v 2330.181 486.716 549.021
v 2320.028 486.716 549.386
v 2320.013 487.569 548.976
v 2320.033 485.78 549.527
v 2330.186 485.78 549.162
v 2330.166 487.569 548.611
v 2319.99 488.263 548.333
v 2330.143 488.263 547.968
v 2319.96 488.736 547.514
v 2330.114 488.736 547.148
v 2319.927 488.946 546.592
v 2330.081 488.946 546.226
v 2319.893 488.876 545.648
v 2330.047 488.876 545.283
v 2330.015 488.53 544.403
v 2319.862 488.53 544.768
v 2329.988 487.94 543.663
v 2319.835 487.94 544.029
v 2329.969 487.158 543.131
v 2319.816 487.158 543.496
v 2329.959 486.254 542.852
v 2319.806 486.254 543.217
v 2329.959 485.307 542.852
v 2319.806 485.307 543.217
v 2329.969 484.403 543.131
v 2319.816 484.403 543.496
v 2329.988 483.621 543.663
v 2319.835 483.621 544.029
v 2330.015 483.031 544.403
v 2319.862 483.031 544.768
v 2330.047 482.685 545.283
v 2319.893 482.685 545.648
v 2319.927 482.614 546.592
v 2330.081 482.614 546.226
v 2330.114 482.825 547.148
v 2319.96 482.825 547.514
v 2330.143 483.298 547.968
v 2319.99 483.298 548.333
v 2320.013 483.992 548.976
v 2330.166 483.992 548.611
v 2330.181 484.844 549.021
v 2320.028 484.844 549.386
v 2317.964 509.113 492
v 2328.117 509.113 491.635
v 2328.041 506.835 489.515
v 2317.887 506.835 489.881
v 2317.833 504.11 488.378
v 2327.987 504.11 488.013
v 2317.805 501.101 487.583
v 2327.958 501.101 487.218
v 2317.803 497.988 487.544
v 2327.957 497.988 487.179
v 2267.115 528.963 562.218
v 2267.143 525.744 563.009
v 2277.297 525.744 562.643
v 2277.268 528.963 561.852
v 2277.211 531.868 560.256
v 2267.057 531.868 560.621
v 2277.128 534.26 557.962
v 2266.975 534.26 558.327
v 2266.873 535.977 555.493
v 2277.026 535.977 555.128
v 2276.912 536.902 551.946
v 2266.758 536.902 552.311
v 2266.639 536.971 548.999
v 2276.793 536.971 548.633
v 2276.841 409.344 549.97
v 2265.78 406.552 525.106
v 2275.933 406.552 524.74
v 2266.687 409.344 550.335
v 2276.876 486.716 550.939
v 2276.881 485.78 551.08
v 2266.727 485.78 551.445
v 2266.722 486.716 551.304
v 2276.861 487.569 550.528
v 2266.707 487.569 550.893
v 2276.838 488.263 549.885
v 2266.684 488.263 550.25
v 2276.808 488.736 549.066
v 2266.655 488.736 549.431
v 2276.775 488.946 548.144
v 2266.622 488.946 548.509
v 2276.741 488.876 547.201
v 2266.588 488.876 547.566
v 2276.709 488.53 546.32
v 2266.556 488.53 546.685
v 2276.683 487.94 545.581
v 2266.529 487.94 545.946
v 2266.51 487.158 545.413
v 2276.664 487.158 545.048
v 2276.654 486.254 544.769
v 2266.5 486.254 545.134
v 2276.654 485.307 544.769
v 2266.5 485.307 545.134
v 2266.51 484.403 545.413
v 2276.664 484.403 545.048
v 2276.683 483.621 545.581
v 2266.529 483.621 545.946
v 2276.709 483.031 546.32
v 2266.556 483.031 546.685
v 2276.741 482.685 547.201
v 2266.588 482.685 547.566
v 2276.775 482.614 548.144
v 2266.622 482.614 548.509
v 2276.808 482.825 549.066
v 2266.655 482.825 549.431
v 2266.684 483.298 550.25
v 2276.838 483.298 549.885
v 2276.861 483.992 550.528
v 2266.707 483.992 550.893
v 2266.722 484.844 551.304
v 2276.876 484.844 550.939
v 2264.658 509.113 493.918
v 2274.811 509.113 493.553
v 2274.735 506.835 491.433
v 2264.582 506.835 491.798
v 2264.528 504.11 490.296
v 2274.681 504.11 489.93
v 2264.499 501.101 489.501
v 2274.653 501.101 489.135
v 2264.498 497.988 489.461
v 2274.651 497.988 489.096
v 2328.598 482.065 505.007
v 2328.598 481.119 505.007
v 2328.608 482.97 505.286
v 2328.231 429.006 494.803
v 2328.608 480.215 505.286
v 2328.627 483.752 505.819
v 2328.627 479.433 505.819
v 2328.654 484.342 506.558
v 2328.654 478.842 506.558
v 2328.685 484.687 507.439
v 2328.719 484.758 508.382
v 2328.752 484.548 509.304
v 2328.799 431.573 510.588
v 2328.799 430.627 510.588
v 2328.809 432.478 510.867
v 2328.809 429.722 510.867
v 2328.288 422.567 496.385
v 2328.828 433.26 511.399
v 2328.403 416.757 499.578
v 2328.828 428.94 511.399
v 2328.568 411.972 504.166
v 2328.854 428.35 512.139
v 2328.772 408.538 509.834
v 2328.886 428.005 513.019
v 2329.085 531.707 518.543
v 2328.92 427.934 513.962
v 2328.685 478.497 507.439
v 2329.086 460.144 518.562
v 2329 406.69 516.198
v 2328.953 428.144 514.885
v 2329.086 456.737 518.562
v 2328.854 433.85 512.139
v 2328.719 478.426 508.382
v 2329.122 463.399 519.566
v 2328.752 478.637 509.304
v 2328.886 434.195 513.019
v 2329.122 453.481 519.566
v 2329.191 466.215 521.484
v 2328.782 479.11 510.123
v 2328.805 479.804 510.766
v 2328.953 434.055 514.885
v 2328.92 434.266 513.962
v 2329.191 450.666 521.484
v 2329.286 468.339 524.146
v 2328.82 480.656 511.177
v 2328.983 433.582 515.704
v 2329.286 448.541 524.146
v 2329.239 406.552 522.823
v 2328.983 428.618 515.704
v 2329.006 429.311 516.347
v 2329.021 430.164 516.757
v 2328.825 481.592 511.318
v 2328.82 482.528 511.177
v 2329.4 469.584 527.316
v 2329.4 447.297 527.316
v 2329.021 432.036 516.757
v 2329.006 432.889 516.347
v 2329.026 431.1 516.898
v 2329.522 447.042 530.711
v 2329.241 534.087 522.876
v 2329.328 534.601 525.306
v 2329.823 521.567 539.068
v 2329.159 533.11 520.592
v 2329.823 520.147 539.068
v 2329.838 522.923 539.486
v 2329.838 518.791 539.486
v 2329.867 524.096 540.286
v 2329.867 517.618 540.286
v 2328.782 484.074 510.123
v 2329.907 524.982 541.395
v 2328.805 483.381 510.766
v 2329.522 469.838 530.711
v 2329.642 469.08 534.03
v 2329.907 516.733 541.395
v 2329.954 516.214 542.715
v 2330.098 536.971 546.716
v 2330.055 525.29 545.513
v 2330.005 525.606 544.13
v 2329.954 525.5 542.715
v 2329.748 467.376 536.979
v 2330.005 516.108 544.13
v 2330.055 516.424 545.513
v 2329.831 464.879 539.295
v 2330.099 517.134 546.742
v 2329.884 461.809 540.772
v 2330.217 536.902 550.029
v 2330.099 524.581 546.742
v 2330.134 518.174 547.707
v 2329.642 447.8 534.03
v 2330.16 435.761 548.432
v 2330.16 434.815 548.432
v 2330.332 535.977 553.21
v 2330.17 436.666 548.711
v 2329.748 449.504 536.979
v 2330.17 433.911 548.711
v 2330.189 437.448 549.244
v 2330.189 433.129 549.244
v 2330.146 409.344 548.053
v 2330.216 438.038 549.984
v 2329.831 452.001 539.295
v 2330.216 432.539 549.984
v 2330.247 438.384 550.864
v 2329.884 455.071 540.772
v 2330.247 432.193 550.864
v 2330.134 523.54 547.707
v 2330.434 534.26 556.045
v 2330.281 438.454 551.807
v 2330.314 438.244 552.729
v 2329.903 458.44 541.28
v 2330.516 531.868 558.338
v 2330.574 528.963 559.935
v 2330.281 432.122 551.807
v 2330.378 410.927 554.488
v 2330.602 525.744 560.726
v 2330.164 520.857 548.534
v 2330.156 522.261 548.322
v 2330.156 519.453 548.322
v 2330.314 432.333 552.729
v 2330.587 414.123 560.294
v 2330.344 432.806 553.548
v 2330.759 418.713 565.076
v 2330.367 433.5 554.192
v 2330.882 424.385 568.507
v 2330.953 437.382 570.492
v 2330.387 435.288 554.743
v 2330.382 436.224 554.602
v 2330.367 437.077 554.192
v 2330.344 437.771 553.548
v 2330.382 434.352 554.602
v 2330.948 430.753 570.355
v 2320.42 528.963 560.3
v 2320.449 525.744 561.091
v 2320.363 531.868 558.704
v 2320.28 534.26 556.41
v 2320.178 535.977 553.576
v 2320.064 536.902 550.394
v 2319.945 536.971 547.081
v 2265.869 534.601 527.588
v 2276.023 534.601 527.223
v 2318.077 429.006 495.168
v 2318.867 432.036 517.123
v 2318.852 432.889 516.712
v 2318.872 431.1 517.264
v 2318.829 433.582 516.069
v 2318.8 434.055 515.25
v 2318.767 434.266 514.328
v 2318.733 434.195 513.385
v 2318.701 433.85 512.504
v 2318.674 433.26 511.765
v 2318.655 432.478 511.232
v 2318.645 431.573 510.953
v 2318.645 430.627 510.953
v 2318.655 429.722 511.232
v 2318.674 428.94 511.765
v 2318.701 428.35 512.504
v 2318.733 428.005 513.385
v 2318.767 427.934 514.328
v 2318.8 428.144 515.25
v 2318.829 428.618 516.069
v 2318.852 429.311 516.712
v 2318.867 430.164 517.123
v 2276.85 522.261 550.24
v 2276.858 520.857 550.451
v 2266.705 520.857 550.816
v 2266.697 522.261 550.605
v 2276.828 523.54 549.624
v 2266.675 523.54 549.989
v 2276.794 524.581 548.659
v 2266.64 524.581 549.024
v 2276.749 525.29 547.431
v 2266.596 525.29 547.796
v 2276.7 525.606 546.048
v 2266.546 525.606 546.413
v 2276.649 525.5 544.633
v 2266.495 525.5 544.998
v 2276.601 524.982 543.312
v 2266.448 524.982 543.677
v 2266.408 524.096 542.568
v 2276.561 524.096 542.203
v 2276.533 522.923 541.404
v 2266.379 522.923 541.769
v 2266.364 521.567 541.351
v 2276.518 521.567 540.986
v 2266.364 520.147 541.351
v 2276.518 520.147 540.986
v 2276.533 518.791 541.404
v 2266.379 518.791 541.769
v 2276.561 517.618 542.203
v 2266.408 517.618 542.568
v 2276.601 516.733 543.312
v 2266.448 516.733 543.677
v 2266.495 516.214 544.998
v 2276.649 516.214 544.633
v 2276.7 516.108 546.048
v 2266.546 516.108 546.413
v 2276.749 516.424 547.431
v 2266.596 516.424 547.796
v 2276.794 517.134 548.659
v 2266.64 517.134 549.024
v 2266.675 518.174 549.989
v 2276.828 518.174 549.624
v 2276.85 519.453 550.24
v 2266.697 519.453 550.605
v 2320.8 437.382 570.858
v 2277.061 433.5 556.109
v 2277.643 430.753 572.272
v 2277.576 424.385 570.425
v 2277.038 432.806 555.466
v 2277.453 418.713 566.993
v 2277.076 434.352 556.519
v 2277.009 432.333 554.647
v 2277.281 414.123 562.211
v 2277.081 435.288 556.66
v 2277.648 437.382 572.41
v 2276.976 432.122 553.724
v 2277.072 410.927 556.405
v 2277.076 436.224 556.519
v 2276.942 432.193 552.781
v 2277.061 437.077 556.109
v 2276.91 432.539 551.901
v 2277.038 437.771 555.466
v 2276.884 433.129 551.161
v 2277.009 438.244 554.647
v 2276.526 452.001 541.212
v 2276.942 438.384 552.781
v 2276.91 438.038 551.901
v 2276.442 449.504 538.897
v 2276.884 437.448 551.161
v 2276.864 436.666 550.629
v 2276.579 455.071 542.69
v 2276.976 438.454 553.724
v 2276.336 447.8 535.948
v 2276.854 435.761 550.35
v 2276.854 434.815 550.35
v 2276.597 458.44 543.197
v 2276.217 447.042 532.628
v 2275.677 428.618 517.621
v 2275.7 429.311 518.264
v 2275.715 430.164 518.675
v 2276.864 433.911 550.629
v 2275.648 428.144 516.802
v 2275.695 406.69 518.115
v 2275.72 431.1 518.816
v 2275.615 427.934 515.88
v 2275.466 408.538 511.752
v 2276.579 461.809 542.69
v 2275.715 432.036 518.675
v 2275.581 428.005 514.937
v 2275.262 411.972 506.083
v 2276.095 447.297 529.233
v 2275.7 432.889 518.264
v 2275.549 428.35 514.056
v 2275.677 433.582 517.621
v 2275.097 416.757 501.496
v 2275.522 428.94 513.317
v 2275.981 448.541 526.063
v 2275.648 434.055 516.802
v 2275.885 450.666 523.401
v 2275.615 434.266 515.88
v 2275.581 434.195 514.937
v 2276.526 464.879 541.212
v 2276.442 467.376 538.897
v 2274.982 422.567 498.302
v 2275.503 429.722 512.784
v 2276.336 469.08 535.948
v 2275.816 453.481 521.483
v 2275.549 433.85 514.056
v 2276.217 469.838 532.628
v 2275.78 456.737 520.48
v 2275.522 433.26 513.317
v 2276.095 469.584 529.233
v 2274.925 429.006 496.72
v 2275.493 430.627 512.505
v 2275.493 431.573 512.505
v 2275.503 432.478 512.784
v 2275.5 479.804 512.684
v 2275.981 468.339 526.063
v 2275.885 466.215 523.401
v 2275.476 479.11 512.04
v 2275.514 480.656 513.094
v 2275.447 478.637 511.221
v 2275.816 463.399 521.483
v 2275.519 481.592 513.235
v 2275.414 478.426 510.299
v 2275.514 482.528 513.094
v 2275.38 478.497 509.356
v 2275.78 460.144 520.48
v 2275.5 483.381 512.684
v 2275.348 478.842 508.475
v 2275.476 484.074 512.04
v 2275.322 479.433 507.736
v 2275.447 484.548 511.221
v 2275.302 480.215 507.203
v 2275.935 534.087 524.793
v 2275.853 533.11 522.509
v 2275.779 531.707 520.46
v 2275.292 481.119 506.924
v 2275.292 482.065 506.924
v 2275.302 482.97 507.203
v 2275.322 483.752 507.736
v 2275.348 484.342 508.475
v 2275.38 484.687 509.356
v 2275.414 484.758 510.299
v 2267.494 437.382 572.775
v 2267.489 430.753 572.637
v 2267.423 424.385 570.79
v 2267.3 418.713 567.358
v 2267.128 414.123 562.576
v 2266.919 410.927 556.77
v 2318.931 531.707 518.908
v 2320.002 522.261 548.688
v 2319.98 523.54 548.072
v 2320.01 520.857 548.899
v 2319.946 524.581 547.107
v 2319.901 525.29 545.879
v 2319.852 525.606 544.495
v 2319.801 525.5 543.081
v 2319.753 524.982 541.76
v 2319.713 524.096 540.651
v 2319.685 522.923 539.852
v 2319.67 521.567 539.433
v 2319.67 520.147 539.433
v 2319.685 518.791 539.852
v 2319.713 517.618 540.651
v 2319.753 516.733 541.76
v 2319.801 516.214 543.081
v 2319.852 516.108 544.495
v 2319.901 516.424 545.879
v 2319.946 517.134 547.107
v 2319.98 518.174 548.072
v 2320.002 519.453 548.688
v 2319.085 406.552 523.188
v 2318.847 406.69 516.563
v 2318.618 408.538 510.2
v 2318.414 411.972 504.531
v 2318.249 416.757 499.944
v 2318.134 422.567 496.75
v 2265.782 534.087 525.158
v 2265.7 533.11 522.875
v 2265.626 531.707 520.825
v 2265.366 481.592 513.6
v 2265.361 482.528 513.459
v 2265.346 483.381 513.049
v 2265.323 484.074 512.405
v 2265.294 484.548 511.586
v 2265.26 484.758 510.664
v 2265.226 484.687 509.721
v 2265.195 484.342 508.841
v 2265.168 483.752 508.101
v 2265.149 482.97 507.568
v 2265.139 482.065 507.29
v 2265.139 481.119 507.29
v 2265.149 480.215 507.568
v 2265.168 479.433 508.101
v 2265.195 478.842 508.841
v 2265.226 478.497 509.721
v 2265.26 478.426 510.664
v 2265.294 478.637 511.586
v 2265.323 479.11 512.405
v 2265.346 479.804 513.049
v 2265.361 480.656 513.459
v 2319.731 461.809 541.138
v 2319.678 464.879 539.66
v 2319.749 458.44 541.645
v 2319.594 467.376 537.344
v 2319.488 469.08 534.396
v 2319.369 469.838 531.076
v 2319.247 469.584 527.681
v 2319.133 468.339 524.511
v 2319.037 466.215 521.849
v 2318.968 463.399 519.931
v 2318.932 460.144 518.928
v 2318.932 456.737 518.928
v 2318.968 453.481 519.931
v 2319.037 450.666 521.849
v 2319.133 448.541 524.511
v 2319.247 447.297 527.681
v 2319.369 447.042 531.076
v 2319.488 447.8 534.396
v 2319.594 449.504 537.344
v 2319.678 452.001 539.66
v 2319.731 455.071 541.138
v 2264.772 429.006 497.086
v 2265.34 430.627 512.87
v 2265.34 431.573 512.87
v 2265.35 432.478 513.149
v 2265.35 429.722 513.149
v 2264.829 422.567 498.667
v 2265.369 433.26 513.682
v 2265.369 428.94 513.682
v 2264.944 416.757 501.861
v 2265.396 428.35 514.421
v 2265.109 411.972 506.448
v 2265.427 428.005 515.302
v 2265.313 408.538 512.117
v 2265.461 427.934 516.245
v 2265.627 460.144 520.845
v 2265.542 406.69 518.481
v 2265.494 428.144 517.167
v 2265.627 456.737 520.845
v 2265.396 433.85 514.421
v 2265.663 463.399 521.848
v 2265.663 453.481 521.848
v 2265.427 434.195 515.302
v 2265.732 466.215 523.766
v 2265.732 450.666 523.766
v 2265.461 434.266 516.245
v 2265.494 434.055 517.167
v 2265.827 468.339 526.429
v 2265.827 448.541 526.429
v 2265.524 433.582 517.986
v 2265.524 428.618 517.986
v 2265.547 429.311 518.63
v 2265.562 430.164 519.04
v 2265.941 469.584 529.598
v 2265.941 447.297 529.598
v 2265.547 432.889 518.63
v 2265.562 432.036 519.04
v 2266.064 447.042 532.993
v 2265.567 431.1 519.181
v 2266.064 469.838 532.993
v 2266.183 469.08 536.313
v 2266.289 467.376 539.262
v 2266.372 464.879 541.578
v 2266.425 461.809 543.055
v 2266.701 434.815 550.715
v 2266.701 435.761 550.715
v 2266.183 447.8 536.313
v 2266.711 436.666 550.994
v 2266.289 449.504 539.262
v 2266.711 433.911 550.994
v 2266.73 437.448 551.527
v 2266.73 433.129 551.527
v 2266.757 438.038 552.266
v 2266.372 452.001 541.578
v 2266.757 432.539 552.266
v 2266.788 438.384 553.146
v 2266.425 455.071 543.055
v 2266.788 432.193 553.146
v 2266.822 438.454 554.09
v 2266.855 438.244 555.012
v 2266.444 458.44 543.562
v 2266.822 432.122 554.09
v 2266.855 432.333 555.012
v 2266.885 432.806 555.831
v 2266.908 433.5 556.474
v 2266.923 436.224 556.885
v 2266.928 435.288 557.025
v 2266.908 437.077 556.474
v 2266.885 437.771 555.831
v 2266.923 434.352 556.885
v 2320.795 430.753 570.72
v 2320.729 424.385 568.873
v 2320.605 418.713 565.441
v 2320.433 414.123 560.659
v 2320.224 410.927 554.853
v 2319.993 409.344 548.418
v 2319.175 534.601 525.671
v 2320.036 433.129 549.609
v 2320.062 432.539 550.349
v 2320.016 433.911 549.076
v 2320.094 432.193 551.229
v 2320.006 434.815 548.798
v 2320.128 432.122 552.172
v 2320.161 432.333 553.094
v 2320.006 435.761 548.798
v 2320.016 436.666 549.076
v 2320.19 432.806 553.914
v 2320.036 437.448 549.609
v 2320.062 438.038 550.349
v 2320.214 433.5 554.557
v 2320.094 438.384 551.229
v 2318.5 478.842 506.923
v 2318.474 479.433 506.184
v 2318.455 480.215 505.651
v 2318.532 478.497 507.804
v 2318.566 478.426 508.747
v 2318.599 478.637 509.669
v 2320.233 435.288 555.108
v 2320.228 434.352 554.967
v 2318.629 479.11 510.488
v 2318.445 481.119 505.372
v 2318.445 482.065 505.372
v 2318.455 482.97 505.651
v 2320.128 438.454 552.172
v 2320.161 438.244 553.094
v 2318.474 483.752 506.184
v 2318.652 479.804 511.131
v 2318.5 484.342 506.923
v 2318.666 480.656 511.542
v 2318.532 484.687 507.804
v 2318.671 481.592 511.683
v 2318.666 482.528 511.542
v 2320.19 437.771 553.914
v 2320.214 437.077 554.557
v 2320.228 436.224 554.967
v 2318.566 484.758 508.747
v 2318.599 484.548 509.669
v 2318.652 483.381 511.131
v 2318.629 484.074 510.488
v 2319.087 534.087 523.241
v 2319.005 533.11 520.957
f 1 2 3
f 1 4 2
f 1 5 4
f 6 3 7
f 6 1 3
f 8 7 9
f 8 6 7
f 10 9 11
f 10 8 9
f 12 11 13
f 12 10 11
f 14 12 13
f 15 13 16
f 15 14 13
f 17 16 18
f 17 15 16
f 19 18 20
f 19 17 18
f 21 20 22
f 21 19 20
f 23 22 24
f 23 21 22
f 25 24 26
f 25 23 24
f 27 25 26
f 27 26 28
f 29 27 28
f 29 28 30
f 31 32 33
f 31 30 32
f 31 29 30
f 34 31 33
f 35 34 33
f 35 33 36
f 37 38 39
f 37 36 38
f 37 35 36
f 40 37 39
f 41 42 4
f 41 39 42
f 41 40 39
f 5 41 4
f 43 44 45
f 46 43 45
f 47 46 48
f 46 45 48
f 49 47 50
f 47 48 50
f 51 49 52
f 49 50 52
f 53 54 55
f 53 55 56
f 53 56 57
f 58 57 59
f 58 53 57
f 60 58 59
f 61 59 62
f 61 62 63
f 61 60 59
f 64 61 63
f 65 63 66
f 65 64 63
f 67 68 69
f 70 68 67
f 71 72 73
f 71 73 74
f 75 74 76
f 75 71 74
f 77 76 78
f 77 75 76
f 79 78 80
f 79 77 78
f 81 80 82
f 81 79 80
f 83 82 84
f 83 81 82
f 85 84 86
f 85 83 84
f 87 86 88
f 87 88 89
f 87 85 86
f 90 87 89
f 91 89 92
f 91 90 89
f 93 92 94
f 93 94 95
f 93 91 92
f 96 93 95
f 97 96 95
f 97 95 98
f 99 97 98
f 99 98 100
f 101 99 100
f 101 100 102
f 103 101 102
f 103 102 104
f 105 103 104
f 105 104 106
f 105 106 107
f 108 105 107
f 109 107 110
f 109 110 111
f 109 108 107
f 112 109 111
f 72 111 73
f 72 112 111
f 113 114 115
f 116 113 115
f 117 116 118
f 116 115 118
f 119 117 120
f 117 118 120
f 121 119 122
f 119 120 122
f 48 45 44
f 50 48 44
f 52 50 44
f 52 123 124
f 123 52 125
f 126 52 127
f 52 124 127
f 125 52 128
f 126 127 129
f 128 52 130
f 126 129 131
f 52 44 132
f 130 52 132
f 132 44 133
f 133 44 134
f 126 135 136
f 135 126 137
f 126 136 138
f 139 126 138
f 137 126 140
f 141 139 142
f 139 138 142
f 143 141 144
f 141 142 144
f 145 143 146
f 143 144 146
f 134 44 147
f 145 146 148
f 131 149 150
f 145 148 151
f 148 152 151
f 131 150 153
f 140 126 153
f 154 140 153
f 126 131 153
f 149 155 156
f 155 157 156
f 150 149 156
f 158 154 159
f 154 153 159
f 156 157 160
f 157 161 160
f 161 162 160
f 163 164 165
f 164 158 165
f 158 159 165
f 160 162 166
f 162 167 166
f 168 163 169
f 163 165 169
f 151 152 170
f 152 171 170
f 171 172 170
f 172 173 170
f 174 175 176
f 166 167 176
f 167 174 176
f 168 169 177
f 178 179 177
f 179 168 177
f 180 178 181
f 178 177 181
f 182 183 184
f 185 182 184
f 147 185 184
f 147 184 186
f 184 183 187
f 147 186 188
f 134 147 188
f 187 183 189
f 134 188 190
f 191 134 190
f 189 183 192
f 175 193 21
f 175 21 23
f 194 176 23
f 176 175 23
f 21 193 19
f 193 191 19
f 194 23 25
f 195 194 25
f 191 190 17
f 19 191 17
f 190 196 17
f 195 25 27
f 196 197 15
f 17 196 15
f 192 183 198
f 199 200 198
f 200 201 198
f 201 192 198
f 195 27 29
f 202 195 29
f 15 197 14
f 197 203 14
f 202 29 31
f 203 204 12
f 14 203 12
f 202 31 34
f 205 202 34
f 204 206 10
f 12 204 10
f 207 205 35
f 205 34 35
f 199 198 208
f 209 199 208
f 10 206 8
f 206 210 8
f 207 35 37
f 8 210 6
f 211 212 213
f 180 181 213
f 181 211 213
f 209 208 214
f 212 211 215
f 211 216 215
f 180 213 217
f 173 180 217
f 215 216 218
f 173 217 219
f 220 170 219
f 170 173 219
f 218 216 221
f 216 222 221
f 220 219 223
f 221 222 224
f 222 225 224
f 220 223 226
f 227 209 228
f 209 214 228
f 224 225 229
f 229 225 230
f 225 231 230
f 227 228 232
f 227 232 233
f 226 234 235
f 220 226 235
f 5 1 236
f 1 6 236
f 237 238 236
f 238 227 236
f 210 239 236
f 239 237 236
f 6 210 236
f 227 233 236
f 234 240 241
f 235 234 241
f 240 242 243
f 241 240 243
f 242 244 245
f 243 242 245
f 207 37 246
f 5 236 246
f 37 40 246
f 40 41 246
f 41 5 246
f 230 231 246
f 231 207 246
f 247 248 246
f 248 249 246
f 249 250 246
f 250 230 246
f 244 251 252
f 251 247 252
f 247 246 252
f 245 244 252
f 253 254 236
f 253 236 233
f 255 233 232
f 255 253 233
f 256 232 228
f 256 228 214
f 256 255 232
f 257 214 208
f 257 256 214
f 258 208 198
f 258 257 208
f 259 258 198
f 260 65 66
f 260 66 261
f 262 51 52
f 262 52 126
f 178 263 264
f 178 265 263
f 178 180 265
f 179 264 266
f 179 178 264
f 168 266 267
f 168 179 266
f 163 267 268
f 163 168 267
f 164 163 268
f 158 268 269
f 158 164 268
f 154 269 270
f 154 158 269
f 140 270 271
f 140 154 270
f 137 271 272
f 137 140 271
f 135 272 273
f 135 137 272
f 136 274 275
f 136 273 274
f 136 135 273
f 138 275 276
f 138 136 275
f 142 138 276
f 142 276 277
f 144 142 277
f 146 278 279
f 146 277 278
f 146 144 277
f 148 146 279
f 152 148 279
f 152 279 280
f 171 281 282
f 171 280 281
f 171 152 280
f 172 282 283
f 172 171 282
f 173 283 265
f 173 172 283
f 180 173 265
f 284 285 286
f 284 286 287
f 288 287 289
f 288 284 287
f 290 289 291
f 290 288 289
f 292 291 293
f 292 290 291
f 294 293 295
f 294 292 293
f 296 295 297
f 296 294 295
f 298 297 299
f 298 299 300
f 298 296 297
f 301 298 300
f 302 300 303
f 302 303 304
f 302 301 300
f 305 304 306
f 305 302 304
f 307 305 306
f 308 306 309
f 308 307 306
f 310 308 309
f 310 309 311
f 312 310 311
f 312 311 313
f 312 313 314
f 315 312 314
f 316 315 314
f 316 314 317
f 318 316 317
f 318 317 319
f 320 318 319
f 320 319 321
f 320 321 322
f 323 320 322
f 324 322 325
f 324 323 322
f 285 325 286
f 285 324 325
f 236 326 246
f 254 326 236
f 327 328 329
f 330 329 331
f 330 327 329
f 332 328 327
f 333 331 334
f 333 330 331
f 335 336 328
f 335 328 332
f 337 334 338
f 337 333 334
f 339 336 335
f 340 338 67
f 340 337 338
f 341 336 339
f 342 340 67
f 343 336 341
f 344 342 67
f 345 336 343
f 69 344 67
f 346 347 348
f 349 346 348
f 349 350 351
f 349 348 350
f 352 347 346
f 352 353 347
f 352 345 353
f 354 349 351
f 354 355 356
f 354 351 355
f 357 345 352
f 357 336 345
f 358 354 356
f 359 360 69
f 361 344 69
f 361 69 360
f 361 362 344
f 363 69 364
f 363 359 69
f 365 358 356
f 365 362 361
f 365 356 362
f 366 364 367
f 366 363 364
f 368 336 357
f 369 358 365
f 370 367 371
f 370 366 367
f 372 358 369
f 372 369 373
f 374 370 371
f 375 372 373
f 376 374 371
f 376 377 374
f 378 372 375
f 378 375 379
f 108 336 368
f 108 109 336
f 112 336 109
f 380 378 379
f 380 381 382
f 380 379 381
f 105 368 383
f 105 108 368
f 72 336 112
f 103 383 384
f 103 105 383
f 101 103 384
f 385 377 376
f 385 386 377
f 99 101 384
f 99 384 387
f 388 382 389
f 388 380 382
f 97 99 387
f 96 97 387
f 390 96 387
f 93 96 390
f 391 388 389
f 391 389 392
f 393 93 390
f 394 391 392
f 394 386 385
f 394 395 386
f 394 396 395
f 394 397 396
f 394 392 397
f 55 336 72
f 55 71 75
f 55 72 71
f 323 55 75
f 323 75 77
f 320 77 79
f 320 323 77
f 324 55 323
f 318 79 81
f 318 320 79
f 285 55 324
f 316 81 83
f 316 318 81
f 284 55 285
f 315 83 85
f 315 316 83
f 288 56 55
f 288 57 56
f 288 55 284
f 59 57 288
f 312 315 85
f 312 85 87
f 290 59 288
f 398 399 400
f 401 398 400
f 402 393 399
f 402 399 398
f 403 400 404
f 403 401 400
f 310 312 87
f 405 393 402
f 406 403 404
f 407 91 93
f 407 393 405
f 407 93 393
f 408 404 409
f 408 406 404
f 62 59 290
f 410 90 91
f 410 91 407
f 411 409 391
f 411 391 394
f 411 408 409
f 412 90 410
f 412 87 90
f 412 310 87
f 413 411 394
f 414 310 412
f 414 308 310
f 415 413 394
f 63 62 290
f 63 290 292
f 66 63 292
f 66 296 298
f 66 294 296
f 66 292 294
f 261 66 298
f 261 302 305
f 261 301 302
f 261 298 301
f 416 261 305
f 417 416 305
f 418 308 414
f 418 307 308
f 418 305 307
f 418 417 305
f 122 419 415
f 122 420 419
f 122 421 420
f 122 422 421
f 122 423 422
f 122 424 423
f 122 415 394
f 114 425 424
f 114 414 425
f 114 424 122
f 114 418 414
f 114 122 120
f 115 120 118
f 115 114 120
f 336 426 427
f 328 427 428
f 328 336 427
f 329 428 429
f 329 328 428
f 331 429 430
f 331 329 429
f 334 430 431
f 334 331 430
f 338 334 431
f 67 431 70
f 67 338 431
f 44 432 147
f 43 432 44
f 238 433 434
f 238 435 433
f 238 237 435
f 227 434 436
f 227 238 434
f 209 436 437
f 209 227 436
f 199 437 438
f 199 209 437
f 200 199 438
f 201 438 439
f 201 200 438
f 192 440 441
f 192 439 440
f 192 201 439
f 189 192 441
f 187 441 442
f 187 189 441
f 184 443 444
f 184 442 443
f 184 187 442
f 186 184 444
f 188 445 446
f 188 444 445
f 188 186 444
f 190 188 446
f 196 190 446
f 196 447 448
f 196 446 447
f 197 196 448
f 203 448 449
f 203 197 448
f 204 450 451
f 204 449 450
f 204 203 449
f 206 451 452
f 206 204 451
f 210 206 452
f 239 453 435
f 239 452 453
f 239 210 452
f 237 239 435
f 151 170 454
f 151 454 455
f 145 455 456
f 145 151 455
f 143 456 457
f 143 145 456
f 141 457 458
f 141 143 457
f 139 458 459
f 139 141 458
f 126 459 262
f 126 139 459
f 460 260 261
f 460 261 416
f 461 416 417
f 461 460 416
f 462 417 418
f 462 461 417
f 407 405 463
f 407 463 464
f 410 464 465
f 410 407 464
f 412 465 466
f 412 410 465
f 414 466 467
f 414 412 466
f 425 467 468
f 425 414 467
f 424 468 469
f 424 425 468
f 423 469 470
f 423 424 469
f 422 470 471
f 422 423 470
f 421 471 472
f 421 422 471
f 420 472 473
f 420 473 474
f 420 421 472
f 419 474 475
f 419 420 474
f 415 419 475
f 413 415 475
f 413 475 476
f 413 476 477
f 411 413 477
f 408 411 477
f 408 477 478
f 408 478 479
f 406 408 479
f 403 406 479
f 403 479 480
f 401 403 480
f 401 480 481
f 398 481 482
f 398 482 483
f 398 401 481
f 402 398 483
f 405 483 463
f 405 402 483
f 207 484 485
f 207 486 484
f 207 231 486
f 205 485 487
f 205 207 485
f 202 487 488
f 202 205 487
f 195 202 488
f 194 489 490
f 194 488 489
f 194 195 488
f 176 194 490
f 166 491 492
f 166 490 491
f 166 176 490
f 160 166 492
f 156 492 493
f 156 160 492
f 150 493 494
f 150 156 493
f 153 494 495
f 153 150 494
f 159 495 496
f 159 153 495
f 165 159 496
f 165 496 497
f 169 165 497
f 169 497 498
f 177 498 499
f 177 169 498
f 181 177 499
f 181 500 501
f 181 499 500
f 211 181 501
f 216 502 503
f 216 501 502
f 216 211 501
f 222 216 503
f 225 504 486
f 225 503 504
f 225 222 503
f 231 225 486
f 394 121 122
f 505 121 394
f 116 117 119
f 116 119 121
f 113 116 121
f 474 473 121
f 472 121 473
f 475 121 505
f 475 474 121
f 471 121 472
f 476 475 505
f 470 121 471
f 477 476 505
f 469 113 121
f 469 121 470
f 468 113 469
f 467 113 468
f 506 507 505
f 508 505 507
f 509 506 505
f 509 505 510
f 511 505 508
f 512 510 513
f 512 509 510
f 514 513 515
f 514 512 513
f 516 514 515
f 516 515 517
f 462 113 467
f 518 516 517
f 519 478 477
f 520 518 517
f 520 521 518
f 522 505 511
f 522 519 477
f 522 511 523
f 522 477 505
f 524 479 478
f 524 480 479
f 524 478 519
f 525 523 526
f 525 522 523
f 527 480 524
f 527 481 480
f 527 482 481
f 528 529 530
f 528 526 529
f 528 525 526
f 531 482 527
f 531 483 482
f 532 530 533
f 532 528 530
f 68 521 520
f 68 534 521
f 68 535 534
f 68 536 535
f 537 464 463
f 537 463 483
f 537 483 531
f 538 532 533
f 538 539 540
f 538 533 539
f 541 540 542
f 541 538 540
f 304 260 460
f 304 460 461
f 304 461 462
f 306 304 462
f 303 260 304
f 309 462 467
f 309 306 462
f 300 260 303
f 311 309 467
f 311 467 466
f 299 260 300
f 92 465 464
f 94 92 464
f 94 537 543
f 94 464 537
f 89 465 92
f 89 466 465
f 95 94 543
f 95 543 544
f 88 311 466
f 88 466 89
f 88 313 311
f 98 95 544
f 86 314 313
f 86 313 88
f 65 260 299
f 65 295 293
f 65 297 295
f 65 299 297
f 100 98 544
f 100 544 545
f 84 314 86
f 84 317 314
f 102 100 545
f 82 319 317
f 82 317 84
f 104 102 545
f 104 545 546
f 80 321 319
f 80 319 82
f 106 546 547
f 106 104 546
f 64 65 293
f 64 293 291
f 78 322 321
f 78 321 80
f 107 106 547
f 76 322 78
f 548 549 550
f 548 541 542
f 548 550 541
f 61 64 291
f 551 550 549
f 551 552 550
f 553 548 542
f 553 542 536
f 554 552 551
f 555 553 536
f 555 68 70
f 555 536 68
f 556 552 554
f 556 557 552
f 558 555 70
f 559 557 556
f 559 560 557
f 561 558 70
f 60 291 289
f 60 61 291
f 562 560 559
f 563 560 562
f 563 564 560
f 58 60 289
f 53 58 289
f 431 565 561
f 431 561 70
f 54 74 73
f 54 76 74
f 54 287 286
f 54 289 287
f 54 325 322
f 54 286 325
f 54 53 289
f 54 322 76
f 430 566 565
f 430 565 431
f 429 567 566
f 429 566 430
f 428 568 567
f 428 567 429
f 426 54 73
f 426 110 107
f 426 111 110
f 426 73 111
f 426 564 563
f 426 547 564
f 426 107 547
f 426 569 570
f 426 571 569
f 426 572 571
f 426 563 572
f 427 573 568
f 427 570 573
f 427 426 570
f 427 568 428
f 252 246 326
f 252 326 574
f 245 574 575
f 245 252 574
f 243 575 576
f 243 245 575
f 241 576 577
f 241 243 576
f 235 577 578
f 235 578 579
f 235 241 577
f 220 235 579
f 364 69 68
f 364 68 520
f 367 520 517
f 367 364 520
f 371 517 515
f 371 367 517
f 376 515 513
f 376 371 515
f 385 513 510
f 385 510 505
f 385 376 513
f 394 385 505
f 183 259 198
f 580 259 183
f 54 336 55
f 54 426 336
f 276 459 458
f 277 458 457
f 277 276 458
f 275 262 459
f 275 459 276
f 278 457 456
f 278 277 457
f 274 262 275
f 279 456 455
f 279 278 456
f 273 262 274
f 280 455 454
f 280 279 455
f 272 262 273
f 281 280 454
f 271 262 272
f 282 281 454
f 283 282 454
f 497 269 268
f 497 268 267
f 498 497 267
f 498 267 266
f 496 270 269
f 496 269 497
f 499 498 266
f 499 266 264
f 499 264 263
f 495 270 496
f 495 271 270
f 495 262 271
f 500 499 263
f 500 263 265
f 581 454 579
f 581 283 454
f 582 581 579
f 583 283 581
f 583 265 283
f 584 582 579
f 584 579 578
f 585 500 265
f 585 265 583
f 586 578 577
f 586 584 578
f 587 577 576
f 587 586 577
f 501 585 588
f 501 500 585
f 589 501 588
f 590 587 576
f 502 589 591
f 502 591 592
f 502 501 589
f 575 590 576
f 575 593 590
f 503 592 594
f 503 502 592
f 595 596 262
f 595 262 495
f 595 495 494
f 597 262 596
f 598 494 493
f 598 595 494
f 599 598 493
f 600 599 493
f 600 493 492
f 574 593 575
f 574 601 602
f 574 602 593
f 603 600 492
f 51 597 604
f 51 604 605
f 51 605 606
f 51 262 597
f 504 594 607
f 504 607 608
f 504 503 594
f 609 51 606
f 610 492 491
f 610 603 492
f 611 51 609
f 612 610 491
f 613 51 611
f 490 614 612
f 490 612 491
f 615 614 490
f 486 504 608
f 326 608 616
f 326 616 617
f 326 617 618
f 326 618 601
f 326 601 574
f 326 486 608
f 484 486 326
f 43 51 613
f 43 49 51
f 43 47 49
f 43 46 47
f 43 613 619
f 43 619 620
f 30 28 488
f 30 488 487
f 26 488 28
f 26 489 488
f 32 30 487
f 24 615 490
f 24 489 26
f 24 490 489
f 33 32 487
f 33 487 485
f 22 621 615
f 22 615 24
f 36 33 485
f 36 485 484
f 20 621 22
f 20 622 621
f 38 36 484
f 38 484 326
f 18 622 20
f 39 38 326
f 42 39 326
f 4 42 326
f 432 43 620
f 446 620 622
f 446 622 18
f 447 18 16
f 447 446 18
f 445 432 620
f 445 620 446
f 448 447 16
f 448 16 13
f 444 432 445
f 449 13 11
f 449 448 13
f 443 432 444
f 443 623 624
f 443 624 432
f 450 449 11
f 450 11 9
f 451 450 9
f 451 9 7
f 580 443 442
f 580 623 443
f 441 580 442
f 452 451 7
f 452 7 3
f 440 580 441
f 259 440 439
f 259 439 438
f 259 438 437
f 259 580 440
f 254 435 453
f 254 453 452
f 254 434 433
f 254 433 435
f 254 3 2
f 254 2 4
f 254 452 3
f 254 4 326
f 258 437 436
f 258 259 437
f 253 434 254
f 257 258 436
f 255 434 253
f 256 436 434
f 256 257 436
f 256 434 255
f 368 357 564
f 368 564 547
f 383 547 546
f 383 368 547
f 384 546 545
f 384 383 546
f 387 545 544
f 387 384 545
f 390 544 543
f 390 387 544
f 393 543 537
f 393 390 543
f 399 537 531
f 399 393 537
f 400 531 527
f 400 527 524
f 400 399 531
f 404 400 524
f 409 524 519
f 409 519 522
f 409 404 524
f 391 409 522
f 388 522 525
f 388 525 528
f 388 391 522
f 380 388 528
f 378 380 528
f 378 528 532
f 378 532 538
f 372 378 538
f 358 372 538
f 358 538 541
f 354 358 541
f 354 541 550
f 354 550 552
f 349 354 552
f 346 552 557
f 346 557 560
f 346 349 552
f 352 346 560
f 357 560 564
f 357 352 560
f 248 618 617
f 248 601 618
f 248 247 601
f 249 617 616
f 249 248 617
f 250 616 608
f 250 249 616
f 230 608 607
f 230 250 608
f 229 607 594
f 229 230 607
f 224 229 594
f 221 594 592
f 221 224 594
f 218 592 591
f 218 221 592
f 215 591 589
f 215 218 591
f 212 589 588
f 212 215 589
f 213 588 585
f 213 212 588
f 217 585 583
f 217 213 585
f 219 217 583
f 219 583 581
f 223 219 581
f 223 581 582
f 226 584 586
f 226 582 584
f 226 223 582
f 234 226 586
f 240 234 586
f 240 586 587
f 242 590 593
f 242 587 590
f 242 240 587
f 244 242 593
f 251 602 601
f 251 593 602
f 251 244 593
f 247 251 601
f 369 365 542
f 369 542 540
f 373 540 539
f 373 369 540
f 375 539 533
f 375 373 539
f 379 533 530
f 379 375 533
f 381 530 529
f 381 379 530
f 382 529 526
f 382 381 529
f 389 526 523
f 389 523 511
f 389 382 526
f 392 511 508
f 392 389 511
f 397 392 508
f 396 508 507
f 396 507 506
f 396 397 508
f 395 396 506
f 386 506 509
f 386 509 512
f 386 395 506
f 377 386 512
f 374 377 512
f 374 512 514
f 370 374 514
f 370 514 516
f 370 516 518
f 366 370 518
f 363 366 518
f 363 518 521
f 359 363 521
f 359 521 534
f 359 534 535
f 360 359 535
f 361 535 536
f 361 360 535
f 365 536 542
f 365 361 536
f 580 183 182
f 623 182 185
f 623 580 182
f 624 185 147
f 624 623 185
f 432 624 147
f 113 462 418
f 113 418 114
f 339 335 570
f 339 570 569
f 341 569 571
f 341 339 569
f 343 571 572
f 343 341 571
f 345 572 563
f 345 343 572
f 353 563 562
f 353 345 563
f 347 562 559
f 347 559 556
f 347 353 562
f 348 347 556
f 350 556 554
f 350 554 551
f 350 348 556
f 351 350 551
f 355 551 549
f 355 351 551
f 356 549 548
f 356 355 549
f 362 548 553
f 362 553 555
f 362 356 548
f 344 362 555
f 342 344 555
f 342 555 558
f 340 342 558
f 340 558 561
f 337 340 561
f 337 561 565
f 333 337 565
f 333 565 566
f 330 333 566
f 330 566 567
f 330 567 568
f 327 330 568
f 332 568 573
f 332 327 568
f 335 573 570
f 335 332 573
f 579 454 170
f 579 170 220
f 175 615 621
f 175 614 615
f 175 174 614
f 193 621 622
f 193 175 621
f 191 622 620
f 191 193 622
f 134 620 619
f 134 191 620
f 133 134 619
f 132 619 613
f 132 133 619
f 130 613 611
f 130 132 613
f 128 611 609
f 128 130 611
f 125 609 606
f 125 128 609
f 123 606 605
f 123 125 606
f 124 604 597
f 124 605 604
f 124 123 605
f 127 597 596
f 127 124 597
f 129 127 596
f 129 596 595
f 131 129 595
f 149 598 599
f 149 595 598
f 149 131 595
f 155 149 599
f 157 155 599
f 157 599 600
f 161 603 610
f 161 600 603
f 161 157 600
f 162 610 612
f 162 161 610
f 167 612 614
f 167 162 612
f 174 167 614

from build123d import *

# Parameters (mm, degrees)
SKETCH2_R               = 4.7625
SKETCH2_R_2             = 3.175
SKETCH2_R_3             = 11.43
BOSS_EXTRUDE1_DEPTH     = 31.75
FILLET1_R               = 25.4
FILLET3_R               = 12.7
CUT_EXTRUDE1_DEPTH      = 2420.162449584
CUT_EXTRUDE1_DEPTH_BACK = 2420.162449584


with BuildPart() as part:
    # Sketch2 → Boss-Extrude1 (new, symmetric)
    with BuildSketch(Plane(origin=(2275.719022847, 0, -81.853759117), x_dir=(0.02419992607999972, -0.7394171395677195, 0.6728124978708514), z_dir=(-0.9993537674319818, 0, 0.03594506251913508))):
        Polygon((137.38245748, 763.046514622), (34.646501725, 837.707906218), (12.248084246, 806.887119491), (10.396857918, 761.134054446), (92.585622522, 701.404941169), align=None)
        with Locations((37.11326636, 814.409603855)):
            Circle(SKETCH2_R, mode=Mode.SUBTRACT)
        with Locations((64.541675287, 792.432956216)):
            Circle(SKETCH2_R_2, mode=Mode.SUBTRACT)
        with Locations((105.636057589, 762.568399578)):
            Circle(SKETCH2_R_2, mode=Mode.SUBTRACT)
        with Locations((83.237640111, 731.747612851)):
            Circle(SKETCH2_R_2, mode=Mode.SUBTRACT)
        with Locations((42.143257808, 761.61216949)):
            Circle(SKETCH2_R_2, mode=Mode.SUBTRACT)
        with Locations((73.889657699, 762.090284534)):
            Circle(SKETCH2_R_3, mode=Mode.SUBTRACT)
    extrude(amount=BOSS_EXTRUDE1_DEPTH, both=True)

    # Fillet1
    fillet1_edges = [part.edges().sort_by_distance(p)[0] for p in [
        (2296.601805866, 403.759777726, 498.73468398),
        (2299.324220067, 412.136269845, 574.423935798),
    ]]
    fillet(fillet1_edges, radius=FILLET1_R)

    # Fillet3
    fillet3_edges = [part.edges().sort_by_distance(p)[0] for p in [
        (2296.200347822, 504.744039468, 487.573245371),
        (2297.461190412, 534.178350963, 522.627511627),
        (2298.822397513, 538.366597022, 560.472137536),
    ]]
    fillet(fillet3_edges, radius=FILLET3_R)

    # Sketch3 → Cut-Extrude1 (cut, two sides: drawn at the far end of the back side and taken through both)
    with BuildSketch(Plane(origin=(-1.333381219, 335.403711787, -37.071003677), x_dir=(0.9999921696711004, 0.00395135039134013, -0.000217776422413385), z_dir=(0.003951358699527253, -0.9939395840765799, 0.10985667922390137)).offset(-CUT_EXTRUDE1_DEPTH_BACK)):
        Polygon((2276.494558522, 540.348010985), (2319.646654317, 538.795906449), (2322.385662322, 614.946663734), (2279.233566526, 616.498768271), align=None)
    extrude(amount=CUT_EXTRUDE1_DEPTH + CUT_EXTRUDE1_DEPTH_BACK, mode=Mode.SUBTRACT)


with BuildPart() as cut_extrude1_piece_1:
    # of the separate pieces the step leaves, piece 1, a body of its own (cut_extrude1_pieces)
    add(part.part.solids().sort_by_distance((2330.602061884, 525.743564305, 560.726061627))[0])


with BuildPart() as cut_extrude1_piece_2:
    # of the separate pieces the step leaves, piece 2, a body of its own (cut_extrude1_pieces)
    add(part.part.solids().sort_by_distance((2277.647807718, 437.38233528, 572.409630045))[0])


solid = Compound([cut_extrude1_piece_1.part, cut_extrude1_piece_2.part])
